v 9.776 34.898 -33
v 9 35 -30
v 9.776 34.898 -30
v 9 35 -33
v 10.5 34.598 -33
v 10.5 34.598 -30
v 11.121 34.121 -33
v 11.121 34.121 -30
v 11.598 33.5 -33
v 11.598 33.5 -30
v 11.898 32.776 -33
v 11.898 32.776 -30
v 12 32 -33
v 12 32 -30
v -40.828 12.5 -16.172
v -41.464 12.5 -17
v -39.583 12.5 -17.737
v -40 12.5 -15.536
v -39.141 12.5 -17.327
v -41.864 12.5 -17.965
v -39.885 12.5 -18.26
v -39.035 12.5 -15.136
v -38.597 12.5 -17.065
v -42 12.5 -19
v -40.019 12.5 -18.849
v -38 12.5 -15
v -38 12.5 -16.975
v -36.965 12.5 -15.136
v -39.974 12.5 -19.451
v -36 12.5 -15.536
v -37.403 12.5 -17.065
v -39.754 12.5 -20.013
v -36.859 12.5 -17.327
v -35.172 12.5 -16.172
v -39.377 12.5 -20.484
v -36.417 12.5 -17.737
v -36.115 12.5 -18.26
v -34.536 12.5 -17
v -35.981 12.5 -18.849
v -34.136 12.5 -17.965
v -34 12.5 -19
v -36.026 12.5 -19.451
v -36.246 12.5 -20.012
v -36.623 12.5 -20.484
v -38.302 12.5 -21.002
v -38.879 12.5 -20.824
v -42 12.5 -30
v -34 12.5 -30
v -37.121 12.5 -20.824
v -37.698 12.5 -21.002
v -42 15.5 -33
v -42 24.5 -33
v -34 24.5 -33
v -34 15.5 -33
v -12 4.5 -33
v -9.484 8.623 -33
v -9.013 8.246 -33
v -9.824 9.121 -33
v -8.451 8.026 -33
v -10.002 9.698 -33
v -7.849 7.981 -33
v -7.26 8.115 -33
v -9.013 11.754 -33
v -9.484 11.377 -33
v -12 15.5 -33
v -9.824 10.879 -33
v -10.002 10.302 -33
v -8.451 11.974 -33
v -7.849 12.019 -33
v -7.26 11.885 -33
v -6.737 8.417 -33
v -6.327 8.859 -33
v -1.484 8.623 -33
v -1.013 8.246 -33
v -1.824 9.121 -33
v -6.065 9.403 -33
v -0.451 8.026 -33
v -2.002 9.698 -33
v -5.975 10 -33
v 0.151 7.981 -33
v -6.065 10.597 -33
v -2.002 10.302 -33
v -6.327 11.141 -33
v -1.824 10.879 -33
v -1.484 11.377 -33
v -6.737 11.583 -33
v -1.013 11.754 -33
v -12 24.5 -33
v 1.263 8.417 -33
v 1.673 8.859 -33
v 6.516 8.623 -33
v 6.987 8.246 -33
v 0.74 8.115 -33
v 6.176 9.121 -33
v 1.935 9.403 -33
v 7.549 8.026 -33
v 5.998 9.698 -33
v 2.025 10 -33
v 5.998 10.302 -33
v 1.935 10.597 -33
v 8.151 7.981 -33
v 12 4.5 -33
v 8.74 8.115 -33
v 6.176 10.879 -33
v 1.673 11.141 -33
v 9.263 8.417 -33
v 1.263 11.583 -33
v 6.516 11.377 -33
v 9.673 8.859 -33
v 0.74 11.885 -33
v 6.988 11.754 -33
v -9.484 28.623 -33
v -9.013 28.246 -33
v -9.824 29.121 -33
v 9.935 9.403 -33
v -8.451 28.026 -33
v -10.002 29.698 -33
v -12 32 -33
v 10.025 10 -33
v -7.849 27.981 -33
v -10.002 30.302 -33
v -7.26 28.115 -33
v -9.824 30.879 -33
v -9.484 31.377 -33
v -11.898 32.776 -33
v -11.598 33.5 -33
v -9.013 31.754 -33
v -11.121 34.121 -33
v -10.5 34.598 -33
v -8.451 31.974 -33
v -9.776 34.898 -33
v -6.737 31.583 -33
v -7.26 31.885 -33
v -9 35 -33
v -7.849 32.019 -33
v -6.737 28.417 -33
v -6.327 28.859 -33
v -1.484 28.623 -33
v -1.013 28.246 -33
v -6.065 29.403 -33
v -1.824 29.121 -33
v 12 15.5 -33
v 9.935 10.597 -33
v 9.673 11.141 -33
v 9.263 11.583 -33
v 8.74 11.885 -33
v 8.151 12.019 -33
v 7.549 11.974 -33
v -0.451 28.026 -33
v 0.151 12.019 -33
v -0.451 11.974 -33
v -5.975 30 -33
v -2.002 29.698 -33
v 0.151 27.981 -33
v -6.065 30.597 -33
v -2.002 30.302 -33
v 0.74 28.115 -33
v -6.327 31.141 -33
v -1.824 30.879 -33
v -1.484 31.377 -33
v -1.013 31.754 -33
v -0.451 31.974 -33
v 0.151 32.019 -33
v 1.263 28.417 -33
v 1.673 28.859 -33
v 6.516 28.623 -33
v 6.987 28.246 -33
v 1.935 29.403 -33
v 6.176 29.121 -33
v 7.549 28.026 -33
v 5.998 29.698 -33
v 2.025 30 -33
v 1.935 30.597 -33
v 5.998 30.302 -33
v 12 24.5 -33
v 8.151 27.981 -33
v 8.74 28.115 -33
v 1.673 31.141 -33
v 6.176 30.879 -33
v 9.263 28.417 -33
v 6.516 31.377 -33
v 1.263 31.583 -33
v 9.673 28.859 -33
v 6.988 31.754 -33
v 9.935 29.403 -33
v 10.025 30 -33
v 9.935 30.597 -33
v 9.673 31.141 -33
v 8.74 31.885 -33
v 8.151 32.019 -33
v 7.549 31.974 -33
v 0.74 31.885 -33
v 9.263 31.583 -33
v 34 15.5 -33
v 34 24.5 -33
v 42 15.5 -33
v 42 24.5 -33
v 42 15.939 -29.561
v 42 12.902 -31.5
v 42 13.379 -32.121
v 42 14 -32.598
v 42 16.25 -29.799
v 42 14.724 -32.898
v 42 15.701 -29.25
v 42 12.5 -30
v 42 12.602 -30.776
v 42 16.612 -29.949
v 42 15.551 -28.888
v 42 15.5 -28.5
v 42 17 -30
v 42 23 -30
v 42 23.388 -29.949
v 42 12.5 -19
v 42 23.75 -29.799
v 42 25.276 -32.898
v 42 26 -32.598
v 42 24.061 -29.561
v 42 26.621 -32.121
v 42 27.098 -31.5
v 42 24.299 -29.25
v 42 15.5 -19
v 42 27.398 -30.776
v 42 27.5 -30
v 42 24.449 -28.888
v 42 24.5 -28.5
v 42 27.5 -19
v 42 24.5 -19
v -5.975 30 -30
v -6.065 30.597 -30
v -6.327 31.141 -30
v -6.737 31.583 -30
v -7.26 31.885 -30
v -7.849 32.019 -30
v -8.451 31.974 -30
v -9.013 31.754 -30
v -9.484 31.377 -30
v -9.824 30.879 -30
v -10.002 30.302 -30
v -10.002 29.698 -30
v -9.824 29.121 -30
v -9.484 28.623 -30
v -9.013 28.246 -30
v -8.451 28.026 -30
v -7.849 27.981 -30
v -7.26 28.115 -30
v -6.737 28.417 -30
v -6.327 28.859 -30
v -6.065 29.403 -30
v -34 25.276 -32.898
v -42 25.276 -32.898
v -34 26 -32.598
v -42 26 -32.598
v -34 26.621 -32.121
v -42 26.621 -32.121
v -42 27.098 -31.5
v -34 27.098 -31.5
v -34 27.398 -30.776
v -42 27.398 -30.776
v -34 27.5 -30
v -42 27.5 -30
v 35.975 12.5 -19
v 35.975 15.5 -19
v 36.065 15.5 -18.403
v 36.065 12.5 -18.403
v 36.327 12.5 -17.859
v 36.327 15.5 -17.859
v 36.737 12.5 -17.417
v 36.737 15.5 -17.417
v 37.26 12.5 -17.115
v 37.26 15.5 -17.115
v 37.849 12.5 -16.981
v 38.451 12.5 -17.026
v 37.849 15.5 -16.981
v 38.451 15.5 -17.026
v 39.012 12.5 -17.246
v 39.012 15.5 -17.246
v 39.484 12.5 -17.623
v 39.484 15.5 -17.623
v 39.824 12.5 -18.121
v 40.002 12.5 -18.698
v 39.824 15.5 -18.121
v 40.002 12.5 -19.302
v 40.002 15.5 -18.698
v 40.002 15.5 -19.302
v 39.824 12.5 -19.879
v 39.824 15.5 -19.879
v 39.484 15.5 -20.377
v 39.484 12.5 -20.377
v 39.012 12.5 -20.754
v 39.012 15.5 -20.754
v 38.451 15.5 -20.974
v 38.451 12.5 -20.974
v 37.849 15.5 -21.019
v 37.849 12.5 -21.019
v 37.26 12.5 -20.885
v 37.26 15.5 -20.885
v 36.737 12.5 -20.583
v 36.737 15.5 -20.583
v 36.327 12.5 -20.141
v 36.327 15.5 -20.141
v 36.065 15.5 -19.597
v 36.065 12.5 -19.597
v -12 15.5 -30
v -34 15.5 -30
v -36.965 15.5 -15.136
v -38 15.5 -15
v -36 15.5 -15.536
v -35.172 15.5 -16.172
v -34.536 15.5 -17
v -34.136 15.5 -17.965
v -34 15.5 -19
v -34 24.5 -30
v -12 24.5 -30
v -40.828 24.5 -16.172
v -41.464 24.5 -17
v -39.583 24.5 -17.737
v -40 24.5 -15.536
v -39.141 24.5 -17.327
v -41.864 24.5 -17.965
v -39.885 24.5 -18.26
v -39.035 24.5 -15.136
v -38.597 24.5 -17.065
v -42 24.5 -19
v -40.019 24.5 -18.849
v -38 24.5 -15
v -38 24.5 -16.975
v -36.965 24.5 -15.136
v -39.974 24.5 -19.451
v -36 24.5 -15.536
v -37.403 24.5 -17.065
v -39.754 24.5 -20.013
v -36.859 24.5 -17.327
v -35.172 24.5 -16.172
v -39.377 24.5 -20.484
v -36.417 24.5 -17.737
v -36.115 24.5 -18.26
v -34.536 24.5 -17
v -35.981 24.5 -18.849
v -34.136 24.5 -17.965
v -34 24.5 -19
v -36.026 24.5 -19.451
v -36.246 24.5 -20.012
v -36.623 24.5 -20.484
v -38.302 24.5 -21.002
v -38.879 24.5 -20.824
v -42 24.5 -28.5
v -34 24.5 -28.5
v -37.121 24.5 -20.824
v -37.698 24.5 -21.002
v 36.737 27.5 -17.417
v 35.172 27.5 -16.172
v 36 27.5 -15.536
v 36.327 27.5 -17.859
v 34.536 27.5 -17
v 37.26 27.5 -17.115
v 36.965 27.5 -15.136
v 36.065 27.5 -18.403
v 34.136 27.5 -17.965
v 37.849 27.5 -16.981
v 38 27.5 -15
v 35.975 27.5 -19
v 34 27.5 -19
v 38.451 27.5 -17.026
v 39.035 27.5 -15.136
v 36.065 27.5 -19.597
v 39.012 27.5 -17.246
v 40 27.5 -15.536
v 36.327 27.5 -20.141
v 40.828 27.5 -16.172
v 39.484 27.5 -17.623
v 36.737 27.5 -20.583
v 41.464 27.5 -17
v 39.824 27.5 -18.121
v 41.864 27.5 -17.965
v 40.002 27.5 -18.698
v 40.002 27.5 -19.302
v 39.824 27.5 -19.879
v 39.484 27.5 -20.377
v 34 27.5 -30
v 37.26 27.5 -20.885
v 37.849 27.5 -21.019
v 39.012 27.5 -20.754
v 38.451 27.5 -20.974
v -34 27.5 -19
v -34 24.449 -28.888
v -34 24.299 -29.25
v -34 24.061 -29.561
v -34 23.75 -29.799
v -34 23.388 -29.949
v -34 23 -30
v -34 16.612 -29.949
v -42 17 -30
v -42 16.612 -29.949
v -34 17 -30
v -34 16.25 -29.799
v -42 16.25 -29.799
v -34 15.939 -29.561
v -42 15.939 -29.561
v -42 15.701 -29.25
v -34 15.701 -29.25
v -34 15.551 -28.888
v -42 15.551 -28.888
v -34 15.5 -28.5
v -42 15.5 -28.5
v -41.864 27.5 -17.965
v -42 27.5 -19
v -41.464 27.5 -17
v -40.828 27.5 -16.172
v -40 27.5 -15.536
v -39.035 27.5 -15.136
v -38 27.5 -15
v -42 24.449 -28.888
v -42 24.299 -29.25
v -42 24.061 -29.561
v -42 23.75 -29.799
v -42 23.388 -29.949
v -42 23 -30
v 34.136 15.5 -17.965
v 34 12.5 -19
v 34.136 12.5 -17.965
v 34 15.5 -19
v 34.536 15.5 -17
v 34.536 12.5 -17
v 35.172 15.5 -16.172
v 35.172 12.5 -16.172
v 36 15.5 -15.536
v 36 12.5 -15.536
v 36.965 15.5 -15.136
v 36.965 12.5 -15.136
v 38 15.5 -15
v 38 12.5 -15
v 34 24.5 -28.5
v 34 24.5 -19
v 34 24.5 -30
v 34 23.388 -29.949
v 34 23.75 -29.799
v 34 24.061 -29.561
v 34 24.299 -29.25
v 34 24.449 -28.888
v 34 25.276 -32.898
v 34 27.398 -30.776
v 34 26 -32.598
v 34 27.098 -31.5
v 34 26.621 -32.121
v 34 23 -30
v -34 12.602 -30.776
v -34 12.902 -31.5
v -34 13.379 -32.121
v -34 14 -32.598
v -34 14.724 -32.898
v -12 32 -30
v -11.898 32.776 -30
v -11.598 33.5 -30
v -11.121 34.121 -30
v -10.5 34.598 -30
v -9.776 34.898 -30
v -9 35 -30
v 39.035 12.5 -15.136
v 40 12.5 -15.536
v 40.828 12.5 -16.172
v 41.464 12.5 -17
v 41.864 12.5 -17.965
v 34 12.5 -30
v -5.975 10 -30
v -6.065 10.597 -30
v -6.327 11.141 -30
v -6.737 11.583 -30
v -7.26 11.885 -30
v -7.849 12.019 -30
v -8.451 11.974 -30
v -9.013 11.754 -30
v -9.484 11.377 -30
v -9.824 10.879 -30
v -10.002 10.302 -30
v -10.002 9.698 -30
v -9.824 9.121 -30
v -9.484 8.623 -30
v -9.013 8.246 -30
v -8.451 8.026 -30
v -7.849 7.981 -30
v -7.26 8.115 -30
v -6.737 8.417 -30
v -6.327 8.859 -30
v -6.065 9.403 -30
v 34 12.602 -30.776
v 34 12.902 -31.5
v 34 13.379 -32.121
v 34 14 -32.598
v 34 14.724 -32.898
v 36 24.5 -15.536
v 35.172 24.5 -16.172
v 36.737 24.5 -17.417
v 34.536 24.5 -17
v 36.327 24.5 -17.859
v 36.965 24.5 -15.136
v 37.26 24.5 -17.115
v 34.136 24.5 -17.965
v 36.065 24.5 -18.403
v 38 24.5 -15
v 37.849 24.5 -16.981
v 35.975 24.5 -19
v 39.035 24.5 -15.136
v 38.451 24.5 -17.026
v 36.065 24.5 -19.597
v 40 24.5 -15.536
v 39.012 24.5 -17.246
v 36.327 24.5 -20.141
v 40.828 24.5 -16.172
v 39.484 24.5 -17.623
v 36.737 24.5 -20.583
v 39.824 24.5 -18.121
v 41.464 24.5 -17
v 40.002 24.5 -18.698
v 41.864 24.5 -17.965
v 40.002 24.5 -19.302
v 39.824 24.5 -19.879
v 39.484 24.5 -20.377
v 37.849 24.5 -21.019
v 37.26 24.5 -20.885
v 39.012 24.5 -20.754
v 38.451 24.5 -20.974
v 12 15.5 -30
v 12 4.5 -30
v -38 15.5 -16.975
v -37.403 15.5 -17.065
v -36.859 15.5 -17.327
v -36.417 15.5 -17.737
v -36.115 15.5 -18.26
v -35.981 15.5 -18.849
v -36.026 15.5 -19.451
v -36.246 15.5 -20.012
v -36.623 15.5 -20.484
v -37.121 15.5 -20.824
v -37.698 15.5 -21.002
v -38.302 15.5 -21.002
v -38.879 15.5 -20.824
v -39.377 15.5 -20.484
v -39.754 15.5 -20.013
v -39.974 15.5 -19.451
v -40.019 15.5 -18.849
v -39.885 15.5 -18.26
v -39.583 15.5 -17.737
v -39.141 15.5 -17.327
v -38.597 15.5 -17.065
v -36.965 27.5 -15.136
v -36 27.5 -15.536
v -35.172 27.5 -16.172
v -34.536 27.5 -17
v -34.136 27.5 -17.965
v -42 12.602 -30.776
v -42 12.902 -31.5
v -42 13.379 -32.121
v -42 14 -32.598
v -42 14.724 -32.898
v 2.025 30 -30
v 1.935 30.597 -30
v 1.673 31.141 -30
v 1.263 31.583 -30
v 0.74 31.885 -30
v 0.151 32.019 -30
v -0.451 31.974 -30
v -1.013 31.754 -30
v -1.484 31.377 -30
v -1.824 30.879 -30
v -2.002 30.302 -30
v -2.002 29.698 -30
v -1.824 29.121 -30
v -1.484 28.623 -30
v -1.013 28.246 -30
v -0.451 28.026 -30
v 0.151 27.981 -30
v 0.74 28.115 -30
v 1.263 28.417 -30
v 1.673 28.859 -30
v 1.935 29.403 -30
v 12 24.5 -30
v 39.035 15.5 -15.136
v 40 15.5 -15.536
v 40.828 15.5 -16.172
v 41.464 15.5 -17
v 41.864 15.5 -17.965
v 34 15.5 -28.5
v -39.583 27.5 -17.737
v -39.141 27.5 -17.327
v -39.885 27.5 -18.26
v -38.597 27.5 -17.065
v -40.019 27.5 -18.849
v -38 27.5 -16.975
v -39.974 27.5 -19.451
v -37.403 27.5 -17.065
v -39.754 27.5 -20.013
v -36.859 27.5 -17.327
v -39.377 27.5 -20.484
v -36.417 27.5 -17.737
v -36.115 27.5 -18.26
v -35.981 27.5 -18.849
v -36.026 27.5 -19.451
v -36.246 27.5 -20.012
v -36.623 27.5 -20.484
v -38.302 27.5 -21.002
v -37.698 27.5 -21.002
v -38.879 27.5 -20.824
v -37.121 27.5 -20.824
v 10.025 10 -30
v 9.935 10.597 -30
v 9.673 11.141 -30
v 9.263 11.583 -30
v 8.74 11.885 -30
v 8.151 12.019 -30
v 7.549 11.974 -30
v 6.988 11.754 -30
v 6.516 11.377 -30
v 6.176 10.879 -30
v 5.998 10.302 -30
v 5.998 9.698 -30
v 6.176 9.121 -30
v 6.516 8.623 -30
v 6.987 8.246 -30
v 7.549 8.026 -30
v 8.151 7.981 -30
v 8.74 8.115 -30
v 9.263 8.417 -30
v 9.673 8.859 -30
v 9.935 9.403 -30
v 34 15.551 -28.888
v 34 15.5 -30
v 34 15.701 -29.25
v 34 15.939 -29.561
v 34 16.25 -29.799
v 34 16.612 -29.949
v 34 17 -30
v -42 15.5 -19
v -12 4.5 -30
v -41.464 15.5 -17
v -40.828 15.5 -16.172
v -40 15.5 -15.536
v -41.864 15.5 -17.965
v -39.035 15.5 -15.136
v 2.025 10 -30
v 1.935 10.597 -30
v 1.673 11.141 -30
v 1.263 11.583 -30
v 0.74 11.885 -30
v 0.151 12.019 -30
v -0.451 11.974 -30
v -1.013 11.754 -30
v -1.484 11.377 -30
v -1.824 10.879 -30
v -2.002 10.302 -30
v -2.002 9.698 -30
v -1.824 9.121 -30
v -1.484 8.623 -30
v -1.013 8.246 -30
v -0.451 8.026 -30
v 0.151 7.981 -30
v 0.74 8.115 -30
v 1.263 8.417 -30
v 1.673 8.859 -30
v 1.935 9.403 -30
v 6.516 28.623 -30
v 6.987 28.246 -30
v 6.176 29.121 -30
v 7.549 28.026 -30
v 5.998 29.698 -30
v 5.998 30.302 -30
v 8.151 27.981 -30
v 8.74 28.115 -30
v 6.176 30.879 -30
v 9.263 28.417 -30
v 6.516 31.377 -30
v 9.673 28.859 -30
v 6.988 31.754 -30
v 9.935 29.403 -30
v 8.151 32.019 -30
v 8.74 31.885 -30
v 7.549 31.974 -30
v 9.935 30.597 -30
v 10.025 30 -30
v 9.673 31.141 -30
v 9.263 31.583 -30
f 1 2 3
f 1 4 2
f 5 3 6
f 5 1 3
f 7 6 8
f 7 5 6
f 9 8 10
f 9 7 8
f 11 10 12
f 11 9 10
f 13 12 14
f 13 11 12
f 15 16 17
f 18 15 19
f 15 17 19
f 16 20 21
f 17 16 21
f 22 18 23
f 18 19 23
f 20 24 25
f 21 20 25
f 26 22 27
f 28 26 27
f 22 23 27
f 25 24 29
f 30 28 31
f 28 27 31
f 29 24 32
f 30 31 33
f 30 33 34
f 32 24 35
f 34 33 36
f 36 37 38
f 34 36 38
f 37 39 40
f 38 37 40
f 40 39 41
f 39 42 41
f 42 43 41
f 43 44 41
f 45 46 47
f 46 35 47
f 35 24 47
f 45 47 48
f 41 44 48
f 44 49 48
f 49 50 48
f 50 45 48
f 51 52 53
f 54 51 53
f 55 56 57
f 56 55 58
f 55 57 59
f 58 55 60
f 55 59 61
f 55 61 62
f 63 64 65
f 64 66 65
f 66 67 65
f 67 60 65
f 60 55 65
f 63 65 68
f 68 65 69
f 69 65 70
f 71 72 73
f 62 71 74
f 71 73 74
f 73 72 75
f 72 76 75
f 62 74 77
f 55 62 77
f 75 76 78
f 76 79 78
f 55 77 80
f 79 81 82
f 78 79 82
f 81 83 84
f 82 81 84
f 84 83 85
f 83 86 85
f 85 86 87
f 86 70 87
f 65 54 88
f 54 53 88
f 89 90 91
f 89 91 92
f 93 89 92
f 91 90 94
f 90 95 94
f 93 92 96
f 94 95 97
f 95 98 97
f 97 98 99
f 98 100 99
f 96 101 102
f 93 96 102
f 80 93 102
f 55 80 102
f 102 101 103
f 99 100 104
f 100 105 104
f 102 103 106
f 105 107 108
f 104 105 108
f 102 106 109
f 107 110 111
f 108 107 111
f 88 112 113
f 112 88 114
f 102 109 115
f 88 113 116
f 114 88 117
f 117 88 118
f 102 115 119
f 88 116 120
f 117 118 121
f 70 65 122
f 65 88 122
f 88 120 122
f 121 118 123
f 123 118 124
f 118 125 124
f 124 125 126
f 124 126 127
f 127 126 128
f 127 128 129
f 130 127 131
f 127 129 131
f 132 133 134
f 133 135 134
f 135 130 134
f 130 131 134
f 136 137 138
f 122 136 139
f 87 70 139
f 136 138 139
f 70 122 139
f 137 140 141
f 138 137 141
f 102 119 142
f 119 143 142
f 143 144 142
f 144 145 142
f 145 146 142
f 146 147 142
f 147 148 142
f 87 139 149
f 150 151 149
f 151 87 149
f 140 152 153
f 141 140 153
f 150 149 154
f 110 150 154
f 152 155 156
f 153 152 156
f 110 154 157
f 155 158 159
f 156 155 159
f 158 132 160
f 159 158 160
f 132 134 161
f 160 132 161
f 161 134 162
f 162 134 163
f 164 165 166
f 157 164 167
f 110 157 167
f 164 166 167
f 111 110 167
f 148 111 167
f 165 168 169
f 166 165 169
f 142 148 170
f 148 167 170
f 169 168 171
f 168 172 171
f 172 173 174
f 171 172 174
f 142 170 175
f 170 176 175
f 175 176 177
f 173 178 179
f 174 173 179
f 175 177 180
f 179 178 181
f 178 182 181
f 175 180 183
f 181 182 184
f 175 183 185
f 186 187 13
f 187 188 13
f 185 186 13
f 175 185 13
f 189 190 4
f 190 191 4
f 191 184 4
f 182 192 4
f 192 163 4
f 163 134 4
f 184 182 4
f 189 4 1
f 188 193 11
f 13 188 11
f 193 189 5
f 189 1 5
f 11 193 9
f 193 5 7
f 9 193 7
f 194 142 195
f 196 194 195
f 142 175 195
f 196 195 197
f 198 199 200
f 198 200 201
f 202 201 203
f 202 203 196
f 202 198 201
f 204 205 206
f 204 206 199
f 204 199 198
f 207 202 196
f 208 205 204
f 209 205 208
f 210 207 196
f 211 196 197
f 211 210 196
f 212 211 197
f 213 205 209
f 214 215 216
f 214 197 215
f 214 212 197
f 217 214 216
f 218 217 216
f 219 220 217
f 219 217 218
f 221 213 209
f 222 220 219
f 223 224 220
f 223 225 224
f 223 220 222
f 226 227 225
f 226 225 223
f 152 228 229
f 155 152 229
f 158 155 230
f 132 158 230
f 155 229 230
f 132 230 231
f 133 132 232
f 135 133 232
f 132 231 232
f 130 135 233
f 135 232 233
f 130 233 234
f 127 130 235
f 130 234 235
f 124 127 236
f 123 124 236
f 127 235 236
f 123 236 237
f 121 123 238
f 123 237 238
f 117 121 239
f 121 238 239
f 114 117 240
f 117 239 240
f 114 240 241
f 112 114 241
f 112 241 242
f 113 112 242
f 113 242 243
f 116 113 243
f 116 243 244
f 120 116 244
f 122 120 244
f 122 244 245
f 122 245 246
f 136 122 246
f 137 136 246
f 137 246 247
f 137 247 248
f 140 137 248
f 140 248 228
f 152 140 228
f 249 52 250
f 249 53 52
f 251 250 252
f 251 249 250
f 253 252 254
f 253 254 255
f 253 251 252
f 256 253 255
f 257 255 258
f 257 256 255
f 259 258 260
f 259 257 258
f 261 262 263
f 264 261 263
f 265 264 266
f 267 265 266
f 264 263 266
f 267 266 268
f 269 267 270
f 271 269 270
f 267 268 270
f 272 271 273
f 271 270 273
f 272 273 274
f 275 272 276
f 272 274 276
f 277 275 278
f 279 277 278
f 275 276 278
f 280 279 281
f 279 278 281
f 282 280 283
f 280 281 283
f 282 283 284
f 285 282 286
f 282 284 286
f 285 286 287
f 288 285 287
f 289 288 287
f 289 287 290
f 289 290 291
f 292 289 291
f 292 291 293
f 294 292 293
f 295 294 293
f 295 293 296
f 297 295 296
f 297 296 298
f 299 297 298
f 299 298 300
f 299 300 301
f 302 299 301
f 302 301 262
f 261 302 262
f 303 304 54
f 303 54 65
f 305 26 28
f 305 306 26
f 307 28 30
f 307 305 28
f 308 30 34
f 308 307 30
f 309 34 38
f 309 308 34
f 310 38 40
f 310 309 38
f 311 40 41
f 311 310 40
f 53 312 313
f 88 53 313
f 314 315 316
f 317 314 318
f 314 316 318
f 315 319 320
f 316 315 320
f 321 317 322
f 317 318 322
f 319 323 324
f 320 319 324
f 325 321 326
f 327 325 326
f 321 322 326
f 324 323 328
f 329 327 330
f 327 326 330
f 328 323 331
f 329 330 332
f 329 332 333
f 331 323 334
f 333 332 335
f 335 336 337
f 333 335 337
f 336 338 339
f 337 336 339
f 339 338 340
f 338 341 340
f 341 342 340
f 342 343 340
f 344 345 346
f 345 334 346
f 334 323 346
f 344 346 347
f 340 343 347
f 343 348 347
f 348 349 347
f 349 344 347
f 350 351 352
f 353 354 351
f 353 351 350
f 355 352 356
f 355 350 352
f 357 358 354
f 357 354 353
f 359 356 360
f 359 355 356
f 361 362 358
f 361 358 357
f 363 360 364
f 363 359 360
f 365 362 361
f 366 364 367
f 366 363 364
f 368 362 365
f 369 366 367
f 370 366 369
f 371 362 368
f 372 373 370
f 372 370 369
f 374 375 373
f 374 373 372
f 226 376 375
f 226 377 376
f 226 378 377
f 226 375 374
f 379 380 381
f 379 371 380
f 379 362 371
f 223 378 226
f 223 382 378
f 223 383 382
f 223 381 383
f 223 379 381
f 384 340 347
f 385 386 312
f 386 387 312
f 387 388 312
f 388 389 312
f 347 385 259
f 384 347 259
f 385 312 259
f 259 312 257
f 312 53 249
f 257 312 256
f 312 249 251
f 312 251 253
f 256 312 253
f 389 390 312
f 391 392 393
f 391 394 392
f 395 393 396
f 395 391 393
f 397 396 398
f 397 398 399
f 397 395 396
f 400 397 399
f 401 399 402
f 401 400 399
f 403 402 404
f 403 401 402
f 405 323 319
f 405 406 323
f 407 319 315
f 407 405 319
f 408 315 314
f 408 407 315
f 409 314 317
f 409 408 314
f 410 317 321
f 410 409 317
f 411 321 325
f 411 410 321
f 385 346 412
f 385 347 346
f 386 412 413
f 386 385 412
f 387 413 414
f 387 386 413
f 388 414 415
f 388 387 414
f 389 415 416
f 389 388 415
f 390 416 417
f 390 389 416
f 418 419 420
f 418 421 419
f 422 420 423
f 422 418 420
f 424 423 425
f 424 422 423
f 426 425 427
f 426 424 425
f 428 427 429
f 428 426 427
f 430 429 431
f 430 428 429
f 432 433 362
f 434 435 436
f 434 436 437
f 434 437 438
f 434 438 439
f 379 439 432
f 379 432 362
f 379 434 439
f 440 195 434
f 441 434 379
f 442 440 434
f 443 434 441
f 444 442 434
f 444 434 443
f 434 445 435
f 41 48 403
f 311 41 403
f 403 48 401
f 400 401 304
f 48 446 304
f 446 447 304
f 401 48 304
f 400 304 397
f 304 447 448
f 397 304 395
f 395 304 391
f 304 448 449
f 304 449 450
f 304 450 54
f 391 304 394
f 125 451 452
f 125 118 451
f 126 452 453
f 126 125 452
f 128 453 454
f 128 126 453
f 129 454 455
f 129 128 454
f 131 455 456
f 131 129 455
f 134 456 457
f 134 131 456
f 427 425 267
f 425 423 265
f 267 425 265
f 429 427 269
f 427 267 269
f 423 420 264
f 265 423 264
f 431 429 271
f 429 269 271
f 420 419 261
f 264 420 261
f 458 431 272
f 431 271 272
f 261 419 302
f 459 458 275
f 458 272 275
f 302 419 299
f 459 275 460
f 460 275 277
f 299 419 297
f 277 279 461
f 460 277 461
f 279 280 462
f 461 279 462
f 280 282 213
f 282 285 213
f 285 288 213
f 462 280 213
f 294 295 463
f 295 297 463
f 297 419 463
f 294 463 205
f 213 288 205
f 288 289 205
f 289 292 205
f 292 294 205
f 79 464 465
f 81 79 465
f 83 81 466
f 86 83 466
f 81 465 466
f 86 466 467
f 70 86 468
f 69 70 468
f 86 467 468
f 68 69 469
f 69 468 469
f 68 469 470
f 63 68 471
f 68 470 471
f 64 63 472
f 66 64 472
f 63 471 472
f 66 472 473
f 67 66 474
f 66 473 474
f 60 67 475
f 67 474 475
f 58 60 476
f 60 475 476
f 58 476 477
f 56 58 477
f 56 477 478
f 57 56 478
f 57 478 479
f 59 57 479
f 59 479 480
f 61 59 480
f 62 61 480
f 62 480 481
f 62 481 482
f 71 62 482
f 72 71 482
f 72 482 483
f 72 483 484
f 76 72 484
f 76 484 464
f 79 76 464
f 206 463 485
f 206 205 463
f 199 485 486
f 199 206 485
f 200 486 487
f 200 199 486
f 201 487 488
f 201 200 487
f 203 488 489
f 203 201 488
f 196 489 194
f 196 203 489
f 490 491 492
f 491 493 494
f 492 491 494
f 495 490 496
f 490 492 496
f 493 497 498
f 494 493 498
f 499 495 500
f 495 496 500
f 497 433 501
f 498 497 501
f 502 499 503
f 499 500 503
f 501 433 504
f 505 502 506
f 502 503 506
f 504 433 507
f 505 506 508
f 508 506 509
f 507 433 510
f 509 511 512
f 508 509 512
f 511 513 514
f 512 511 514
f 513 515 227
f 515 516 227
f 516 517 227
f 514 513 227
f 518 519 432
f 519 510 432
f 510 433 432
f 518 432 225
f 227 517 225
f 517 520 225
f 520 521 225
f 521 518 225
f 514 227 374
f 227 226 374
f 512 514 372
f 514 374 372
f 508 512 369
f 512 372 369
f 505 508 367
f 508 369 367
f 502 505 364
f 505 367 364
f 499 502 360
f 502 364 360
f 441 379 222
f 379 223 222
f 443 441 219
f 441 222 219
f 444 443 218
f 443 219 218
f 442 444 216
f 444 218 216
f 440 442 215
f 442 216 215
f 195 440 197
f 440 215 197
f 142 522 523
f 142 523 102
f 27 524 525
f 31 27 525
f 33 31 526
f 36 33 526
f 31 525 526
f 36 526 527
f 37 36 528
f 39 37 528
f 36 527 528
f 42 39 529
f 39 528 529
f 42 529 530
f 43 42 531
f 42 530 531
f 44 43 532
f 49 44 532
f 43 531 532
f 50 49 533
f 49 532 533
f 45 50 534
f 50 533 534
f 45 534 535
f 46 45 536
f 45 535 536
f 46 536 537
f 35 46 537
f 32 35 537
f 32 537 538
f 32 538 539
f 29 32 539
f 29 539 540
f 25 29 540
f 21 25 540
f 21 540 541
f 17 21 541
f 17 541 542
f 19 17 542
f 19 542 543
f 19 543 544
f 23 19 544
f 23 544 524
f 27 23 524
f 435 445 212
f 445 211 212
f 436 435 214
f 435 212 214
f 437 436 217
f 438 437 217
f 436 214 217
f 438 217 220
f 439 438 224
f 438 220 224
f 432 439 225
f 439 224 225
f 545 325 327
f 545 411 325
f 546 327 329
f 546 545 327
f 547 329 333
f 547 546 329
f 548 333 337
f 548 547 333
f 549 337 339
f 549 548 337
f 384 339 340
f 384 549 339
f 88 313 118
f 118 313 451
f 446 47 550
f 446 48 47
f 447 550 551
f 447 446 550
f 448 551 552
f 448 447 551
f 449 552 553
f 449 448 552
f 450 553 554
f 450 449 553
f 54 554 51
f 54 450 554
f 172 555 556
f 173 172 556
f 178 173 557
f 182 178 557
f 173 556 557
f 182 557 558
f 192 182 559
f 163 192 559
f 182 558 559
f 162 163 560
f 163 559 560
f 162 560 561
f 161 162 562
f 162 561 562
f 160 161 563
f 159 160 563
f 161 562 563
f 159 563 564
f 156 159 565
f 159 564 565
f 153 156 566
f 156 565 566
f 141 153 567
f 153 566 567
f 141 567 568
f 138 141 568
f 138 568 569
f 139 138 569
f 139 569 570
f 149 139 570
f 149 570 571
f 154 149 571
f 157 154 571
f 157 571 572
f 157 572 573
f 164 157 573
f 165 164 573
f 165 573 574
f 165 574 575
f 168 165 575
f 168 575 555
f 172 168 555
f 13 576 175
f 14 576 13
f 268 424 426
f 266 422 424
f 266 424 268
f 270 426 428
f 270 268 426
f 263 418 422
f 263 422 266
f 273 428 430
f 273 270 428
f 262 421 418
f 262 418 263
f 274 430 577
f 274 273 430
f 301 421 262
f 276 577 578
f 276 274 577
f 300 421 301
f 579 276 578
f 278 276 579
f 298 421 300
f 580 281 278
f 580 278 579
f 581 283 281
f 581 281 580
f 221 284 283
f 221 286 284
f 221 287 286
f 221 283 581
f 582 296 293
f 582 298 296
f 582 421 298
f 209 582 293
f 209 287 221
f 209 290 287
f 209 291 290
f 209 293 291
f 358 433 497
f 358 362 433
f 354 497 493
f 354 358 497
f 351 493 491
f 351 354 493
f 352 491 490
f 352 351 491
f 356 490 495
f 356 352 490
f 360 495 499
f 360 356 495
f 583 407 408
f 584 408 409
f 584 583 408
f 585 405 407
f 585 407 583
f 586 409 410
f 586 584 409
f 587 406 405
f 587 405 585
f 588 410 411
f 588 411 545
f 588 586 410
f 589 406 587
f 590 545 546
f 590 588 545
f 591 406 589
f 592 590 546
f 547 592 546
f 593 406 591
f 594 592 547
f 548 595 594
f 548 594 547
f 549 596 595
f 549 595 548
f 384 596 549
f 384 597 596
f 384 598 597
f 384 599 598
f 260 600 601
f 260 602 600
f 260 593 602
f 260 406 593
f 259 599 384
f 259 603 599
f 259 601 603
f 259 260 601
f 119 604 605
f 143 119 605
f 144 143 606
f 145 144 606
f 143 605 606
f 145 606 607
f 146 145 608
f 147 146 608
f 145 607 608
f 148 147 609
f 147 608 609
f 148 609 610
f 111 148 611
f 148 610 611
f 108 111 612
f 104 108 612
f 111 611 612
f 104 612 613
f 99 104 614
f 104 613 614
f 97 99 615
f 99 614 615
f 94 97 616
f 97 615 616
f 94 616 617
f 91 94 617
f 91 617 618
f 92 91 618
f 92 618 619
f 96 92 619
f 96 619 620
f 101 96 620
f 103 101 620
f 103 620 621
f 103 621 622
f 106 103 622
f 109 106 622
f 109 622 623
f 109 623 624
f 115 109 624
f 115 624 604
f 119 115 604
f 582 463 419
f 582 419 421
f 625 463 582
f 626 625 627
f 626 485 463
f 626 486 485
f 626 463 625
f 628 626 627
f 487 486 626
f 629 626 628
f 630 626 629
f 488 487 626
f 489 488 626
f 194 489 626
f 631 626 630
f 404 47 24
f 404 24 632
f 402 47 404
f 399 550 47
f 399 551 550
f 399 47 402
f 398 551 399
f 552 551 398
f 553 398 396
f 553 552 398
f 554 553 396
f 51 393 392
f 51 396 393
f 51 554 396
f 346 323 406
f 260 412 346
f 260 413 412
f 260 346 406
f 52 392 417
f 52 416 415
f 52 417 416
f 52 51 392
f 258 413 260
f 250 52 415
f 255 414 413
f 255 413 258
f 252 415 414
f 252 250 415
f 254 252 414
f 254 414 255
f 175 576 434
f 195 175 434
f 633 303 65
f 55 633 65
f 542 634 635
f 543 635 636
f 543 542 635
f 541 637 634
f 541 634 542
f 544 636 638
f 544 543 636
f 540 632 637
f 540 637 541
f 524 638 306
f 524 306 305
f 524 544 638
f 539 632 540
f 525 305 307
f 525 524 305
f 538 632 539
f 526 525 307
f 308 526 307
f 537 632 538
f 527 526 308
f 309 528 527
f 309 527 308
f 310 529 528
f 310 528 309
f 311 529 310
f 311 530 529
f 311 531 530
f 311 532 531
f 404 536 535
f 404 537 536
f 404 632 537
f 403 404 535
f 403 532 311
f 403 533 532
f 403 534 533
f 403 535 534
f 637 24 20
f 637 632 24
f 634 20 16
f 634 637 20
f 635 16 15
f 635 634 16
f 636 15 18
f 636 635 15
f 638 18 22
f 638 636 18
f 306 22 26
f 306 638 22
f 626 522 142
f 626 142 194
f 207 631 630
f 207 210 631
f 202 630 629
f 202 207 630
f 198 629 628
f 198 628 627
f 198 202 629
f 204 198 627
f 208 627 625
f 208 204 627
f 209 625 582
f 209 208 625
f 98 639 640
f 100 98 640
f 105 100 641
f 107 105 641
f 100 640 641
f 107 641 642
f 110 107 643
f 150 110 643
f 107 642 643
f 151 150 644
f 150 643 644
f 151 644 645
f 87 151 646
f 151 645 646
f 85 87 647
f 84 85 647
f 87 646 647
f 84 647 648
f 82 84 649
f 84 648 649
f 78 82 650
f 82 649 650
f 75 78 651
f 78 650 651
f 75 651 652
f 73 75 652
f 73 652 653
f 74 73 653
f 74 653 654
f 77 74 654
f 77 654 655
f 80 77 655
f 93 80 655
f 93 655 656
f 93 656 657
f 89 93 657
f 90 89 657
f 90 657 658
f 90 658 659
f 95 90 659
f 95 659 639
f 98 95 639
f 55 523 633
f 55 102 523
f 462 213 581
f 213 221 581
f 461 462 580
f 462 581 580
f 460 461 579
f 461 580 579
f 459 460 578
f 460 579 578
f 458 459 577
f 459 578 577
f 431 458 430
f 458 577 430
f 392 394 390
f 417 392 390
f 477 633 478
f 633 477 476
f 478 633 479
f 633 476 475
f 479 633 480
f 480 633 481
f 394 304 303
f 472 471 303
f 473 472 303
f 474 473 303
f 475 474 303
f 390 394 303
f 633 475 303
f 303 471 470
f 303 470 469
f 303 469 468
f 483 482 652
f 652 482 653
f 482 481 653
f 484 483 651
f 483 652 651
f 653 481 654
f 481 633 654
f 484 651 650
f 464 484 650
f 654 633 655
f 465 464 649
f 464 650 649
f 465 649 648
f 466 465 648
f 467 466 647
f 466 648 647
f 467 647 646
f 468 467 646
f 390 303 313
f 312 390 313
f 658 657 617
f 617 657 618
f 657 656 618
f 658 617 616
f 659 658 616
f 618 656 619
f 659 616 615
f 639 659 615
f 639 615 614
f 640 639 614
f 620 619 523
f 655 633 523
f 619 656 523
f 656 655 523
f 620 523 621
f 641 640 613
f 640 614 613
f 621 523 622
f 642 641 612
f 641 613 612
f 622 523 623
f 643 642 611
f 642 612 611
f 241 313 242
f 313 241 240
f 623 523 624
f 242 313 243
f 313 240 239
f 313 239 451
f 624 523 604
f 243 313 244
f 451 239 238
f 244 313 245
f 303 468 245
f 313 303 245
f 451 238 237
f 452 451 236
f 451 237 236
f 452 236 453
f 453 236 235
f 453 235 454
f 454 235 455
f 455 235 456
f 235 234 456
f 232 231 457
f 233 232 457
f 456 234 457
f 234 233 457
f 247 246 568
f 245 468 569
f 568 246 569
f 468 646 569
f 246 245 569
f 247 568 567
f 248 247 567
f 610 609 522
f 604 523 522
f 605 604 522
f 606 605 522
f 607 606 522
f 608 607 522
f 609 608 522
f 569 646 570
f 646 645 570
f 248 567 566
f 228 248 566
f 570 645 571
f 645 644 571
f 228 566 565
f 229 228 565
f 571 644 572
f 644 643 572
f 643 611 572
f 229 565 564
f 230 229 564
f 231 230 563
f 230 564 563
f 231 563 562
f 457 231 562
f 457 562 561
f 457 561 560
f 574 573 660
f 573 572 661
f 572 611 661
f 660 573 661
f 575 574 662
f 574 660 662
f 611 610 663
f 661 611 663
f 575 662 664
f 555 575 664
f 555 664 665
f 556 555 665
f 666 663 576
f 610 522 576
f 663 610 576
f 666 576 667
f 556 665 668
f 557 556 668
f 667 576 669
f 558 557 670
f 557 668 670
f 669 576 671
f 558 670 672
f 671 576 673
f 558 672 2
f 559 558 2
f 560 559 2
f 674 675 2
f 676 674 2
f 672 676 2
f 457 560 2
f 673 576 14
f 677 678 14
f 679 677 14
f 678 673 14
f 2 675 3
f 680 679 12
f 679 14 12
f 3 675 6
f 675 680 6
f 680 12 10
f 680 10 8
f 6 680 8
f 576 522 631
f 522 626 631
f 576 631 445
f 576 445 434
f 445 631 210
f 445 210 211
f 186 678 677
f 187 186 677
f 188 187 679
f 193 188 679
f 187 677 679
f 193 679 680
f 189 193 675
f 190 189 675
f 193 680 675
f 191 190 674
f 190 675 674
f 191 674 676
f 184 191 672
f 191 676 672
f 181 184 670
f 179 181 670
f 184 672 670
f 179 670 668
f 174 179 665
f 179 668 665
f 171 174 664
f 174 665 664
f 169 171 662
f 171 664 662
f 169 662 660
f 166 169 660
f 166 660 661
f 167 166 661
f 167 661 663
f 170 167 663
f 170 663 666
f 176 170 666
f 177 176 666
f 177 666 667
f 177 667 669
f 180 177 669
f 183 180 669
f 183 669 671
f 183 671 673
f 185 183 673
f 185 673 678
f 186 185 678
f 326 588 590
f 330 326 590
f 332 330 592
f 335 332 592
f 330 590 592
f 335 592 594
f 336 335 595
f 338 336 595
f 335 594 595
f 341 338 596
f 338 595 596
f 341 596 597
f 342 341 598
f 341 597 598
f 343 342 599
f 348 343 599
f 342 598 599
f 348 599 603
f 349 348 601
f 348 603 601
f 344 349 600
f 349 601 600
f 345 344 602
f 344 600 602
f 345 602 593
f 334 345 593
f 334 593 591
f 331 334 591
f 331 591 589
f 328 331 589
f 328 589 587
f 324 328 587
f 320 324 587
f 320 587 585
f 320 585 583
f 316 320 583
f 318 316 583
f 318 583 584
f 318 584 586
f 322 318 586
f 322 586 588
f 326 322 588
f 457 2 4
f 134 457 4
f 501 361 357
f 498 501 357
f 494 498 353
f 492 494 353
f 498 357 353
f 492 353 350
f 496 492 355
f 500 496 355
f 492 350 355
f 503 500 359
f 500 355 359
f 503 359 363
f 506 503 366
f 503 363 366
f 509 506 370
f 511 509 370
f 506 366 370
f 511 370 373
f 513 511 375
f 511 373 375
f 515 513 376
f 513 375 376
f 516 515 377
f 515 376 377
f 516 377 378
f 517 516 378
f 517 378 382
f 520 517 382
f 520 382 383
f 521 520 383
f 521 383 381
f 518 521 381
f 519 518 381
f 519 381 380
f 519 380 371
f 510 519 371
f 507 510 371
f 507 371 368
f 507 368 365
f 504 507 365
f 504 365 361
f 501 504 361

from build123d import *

# Parameters (mm, degrees)
SKETCH1_W                = 40
SKETCH1_H                = 60
BOSS_EXTRUDE1_DEPTH      = 3
BOSS_EXTRUDE3_DEPTH      = 10
BOSS_EXTRUDE3_DEPTH_BACK = 50
SKETCH4_R                = 2.025
CUT_EXTRUDE1_DEPTH       = 76.663729752
SKETCH5_W                = 10
SKETCH5_H                = 3
CUT_EXTRUDE3_DEPTH       = 5
FILLET5_R                = 3
FILLET6_R                = 1.5
SKETCH6_W                = 18
SKETCH6_H                = 30
CUT_EXTRUDE4_DEPTH       = 76.663729752
SKETCH7_W                = 30
SKETCH7_H                = 9
BOSS_EXTRUDE4_DEPTH      = 3
SKETCH8_W                = 8
SKETCH8_H                = 4.5
CUT_EXTRUDE5_DEPTH       = 62.26173357
BOSS_EXTRUDE5_DEPTH      = 15
BOSS_EXTRUDE5_DEPTH_BACK = 3
SKETCH9_W                = 8
SKETCH9_H                = 3
FILLET7_R                = 3
FILLET8_R                = 1.5
SKETCH10_R               = 2.025
CUT_EXTRUDE6_DEPTH       = 16
FILLET9_R                = 4
FILLET10_R               = 3
CUT_EXTRUDE7_DEPTH       = 82.172655494
CUT_EXTRUDE7_DEPTH_BACK  = 10


with BuildPart() as part:
    # Sketch1 → Boss-Extrude1 (new body)
    with BuildSketch(Plane(origin=(0, 0, 0), x_dir=(1, 0, 0), z_dir=(0, 1, 0))):
        Rectangle(SKETCH1_W, SKETCH1_H)
    extrude(amount=BOSS_EXTRUDE1_DEPTH)

    # Sketch3 → Boss-Extrude3 (add, two sides: drawn at the far end of the back side and taken through both)
    with BuildSketch(Plane.ZY.offset(20).offset(-BOSS_EXTRUDE3_DEPTH_BACK)):
        Polygon((-30, 3), (-30, 35), (-33, 35), (-33, 0), (-30, 0), align=None)
    extrude(amount=BOSS_EXTRUDE3_DEPTH + BOSS_EXTRUDE3_DEPTH_BACK)

    # Sketch4 → Cut-Extrude1 (cut, through all)
    with BuildSketch(Plane.XY.offset(-30)):
        with Locations((0, 30)):
            Circle(SKETCH4_R)
        with Locations((8, 30)):
            Circle(SKETCH4_R)
        with Locations((16, 30)):
            Circle(SKETCH4_R)
        with Locations((-8, 30)):
            Circle(SKETCH4_R)
        with Locations((-16, 30)):
            Circle(SKETCH4_R)
        with Locations((-16, 10)):
            Circle(SKETCH4_R)
        with Locations((-8, 10)):
            Circle(SKETCH4_R)
        with Locations((0, 10)):
            Circle(SKETCH4_R)
        with Locations((8, 10)):
            Circle(SKETCH4_R)
        with Locations((16, 10)):
            Circle(SKETCH4_R)
    extrude(amount=-CUT_EXTRUDE1_DEPTH, mode=Mode.SUBTRACT)

    # Sketch5 → Cut-Extrude3 (cut)
    with BuildSketch(Plane.XZ):
        with Locations((-25, -31.5)):
            Rectangle(SKETCH5_W, SKETCH5_H)
        with Locations((25, -31.5)):
            Rectangle(SKETCH5_W, SKETCH5_H)
    extrude(amount=-CUT_EXTRUDE3_DEPTH, mode=Mode.SUBTRACT)

    # Fillet5
    fillet5_edges = [part.edges().sort_by_distance(p)[0] for p in [
        (0, 0, -33),
    ]]
    fillet(fillet5_edges, radius=FILLET5_R)

    # Fillet6
    fillet6_edges = [part.edges().sort_by_distance(p)[0] for p in [
        (0, 3, -30),
    ]]
    fillet(fillet6_edges, radius=FILLET6_R)

    # Sketch6 → Cut-Extrude4 (cut, through all)
    with BuildSketch(Plane.XY.offset(-30)):
        with Locations((-21, 20)):
            Rectangle(SKETCH6_W, SKETCH6_H)
        with Locations((21, 20)):
            Rectangle(SKETCH6_W, SKETCH6_H)
    extrude(amount=-CUT_EXTRUDE4_DEPTH, mode=Mode.SUBTRACT)

    # Sketch7 → Boss-Extrude4 (add)
    with BuildSketch(Plane.XY.offset(-30)):
        with Locations((-27, 20)):
            Rectangle(SKETCH7_W, SKETCH7_H)
        with Locations((27, 20)):
            Rectangle(SKETCH7_W, SKETCH7_H)
    extrude(amount=-BOSS_EXTRUDE4_DEPTH)

    # Sketch8 → Cut-Extrude5 (cut, through all)
    with BuildSketch(Plane(origin=(0, 5, 0), x_dir=(1, 0, 0), z_dir=(0, 1, 0))):
        with Locations((-16, 30.75)):
            Rectangle(SKETCH8_W, SKETCH8_H)
        with Locations((16, 30.75)):
            Rectangle(SKETCH8_W, SKETCH8_H)
    extrude(amount=-CUT_EXTRUDE5_DEPTH, mode=Mode.SUBTRACT)

    # Sketch9 → Boss-Extrude5 (add, two sides: drawn at the far end of the back side and taken through both)
    with BuildSketch(Plane.XY.offset(-30).offset(-BOSS_EXTRUDE5_DEPTH_BACK)):
        with Locations((-38, 26)):
            Rectangle(SKETCH9_W, SKETCH9_H)
        with Locations((-38, 14)):
            Rectangle(SKETCH9_W, SKETCH9_H)
        with Locations((38, 14)):
            Rectangle(SKETCH9_W, SKETCH9_H)
        with Locations((38, 26)):
            Rectangle(SKETCH9_W, SKETCH9_H)
    extrude(amount=BOSS_EXTRUDE5_DEPTH + BOSS_EXTRUDE5_DEPTH_BACK)

    # Fillet7
    fillet7_edges = [part.edges().sort_by_distance(p)[0] for p in [
        (38, 12.5, -33),
        (-38, 12.5, -33),
        (38, 27.5, -33),
        (-38, 27.5, -33),
    ]]
    fillet(fillet7_edges, radius=FILLET7_R)

    # Fillet8
    fillet8_edges = [part.edges().sort_by_distance(p)[0] for p in [
        (-38, 15.5, -30),
        (38, 24.5, -30),
        (-38, 24.5, -30),
        (38, 15.5, -30),
    ]]
    fillet(fillet8_edges, radius=FILLET8_R)

    # Sketch10 → Cut-Extrude6 (cut)
    with BuildSketch(Plane(origin=(0, 27.5, 0), x_dir=(1, 0, 0), z_dir=(0, 1, 0))):
        with Locations(Location((-38, 19, 0), (0, 0, 270))):
            Circle(SKETCH10_R)
        with Locations(Location((38, 19, 0), (0, 0, 180))):
            Circle(SKETCH10_R)
    extrude(amount=-CUT_EXTRUDE6_DEPTH, mode=Mode.SUBTRACT)

    # Fillet9
    fillet9_edges = [part.edges().sort_by_distance(p)[0] for p in [
        (42, 14, -15),
        (42, 26, -15),
        (-34, 14, -15),
        (-34, 26, -15),
        (34, 14, -15),
        (34, 26, -15),
        (-42, 14, -15),
        (-42, 26, -15),
    ]]
    fillet(fillet9_edges, radius=FILLET9_R - 0.0001)  # a hair under: the kernel refuses the full size

    # Fillet10
    fillet10_edges = [part.edges().sort_by_distance(p)[0] for p in [
        (-12, 35, -31.5),
        (12, 35, -31.5),
        (-20, 1.5, -28.5),
        (20, 1.5, -28.5),
        (20, 1.5, 30),
        (-20, 1.5, 30),
    ]]
    fillet(fillet10_edges, radius=FILLET10_R)

    # Sketch11 → Cut-Extrude7 (cut, two sides: drawn at the far end of the back side and taken through both)
    with BuildSketch(Plane.XY.offset(-30).offset(-CUT_EXTRUDE7_DEPTH_BACK)):
        Polygon((-12, 4.5), (-24.843413812, 4.5), (-24.843413812, -2.532189306), (23.385466992, -2.532189306), (23.385466992, 4.5), align=None)
    extrude(amount=CUT_EXTRUDE7_DEPTH + CUT_EXTRUDE7_DEPTH_BACK, mode=Mode.SUBTRACT)


solid = part.part
